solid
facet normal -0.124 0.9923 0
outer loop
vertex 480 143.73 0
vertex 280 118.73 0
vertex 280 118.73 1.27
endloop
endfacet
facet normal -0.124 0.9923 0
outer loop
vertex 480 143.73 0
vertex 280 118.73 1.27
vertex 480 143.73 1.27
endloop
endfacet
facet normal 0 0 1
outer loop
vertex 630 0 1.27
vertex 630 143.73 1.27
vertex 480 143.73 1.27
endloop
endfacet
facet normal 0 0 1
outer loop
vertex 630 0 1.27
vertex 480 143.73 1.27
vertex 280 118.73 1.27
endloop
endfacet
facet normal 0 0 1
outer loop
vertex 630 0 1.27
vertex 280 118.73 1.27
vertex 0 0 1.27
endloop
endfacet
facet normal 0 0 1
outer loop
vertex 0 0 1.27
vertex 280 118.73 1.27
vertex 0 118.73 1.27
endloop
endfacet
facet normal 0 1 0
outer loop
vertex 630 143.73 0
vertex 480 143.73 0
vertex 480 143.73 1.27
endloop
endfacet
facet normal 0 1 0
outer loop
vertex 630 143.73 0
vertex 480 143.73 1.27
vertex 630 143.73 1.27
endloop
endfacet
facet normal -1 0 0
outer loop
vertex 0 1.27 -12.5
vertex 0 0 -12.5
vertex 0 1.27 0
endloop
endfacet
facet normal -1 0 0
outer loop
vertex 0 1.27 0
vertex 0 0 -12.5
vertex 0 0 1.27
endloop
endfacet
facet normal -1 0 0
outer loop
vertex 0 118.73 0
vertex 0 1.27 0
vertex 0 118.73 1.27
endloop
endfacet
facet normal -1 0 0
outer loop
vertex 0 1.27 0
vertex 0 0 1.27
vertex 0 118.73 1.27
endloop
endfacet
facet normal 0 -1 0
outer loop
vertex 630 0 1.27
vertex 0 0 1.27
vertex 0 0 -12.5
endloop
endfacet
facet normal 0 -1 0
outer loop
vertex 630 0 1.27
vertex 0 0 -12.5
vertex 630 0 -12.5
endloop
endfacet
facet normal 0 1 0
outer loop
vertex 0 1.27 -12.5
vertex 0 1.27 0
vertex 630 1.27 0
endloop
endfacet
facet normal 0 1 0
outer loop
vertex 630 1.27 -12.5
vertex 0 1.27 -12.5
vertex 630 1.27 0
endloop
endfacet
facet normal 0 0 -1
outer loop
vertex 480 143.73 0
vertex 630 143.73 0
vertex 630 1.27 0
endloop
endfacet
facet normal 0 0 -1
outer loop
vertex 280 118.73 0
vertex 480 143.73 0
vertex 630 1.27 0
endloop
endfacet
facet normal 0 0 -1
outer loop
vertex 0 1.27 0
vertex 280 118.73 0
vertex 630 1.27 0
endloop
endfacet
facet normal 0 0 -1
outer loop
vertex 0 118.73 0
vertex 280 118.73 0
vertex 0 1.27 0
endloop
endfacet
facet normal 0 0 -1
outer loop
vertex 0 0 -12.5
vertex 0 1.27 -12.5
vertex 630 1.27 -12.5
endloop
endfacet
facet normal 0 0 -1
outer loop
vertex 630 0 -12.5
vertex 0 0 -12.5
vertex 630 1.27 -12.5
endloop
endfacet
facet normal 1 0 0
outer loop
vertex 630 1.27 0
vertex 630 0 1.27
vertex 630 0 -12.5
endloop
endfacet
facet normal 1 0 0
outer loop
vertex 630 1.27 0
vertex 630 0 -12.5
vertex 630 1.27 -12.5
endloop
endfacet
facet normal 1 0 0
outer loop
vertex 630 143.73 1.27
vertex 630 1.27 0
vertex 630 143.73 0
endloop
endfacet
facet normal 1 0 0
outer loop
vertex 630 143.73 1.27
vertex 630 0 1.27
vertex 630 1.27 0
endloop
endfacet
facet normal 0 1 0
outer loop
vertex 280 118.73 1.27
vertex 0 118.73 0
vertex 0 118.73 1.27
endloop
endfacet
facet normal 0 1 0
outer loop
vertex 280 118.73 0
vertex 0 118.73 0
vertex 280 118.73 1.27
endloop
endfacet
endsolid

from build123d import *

# Parameters (mm, degrees)
BOSS_EXTRUDE1_DEPTH = 1.27
SKETCH2_W           = 630
SKETCH2_H           = 1.27
BOSS_EXTRUDE2_DEPTH = 13.77


with BuildPart() as part:
    # Sketch1 → Boss-Extrude1 (new body)
    with BuildSketch(Plane.XY):
        Polygon((0, 0), (0, 118.73), (280, 118.73), (480, 143.73), (630, 143.73), (630, 0), align=None)
    extrude(amount=BOSS_EXTRUDE1_DEPTH)

    # Sketch2 → Boss-Extrude2 (add)
    with BuildSketch(Plane.XY.offset(1.27)):
        with Locations((315, 0.635)):
            Rectangle(SKETCH2_W, SKETCH2_H)
    extrude(amount=-BOSS_EXTRUDE2_DEPTH)


solid = part.part
